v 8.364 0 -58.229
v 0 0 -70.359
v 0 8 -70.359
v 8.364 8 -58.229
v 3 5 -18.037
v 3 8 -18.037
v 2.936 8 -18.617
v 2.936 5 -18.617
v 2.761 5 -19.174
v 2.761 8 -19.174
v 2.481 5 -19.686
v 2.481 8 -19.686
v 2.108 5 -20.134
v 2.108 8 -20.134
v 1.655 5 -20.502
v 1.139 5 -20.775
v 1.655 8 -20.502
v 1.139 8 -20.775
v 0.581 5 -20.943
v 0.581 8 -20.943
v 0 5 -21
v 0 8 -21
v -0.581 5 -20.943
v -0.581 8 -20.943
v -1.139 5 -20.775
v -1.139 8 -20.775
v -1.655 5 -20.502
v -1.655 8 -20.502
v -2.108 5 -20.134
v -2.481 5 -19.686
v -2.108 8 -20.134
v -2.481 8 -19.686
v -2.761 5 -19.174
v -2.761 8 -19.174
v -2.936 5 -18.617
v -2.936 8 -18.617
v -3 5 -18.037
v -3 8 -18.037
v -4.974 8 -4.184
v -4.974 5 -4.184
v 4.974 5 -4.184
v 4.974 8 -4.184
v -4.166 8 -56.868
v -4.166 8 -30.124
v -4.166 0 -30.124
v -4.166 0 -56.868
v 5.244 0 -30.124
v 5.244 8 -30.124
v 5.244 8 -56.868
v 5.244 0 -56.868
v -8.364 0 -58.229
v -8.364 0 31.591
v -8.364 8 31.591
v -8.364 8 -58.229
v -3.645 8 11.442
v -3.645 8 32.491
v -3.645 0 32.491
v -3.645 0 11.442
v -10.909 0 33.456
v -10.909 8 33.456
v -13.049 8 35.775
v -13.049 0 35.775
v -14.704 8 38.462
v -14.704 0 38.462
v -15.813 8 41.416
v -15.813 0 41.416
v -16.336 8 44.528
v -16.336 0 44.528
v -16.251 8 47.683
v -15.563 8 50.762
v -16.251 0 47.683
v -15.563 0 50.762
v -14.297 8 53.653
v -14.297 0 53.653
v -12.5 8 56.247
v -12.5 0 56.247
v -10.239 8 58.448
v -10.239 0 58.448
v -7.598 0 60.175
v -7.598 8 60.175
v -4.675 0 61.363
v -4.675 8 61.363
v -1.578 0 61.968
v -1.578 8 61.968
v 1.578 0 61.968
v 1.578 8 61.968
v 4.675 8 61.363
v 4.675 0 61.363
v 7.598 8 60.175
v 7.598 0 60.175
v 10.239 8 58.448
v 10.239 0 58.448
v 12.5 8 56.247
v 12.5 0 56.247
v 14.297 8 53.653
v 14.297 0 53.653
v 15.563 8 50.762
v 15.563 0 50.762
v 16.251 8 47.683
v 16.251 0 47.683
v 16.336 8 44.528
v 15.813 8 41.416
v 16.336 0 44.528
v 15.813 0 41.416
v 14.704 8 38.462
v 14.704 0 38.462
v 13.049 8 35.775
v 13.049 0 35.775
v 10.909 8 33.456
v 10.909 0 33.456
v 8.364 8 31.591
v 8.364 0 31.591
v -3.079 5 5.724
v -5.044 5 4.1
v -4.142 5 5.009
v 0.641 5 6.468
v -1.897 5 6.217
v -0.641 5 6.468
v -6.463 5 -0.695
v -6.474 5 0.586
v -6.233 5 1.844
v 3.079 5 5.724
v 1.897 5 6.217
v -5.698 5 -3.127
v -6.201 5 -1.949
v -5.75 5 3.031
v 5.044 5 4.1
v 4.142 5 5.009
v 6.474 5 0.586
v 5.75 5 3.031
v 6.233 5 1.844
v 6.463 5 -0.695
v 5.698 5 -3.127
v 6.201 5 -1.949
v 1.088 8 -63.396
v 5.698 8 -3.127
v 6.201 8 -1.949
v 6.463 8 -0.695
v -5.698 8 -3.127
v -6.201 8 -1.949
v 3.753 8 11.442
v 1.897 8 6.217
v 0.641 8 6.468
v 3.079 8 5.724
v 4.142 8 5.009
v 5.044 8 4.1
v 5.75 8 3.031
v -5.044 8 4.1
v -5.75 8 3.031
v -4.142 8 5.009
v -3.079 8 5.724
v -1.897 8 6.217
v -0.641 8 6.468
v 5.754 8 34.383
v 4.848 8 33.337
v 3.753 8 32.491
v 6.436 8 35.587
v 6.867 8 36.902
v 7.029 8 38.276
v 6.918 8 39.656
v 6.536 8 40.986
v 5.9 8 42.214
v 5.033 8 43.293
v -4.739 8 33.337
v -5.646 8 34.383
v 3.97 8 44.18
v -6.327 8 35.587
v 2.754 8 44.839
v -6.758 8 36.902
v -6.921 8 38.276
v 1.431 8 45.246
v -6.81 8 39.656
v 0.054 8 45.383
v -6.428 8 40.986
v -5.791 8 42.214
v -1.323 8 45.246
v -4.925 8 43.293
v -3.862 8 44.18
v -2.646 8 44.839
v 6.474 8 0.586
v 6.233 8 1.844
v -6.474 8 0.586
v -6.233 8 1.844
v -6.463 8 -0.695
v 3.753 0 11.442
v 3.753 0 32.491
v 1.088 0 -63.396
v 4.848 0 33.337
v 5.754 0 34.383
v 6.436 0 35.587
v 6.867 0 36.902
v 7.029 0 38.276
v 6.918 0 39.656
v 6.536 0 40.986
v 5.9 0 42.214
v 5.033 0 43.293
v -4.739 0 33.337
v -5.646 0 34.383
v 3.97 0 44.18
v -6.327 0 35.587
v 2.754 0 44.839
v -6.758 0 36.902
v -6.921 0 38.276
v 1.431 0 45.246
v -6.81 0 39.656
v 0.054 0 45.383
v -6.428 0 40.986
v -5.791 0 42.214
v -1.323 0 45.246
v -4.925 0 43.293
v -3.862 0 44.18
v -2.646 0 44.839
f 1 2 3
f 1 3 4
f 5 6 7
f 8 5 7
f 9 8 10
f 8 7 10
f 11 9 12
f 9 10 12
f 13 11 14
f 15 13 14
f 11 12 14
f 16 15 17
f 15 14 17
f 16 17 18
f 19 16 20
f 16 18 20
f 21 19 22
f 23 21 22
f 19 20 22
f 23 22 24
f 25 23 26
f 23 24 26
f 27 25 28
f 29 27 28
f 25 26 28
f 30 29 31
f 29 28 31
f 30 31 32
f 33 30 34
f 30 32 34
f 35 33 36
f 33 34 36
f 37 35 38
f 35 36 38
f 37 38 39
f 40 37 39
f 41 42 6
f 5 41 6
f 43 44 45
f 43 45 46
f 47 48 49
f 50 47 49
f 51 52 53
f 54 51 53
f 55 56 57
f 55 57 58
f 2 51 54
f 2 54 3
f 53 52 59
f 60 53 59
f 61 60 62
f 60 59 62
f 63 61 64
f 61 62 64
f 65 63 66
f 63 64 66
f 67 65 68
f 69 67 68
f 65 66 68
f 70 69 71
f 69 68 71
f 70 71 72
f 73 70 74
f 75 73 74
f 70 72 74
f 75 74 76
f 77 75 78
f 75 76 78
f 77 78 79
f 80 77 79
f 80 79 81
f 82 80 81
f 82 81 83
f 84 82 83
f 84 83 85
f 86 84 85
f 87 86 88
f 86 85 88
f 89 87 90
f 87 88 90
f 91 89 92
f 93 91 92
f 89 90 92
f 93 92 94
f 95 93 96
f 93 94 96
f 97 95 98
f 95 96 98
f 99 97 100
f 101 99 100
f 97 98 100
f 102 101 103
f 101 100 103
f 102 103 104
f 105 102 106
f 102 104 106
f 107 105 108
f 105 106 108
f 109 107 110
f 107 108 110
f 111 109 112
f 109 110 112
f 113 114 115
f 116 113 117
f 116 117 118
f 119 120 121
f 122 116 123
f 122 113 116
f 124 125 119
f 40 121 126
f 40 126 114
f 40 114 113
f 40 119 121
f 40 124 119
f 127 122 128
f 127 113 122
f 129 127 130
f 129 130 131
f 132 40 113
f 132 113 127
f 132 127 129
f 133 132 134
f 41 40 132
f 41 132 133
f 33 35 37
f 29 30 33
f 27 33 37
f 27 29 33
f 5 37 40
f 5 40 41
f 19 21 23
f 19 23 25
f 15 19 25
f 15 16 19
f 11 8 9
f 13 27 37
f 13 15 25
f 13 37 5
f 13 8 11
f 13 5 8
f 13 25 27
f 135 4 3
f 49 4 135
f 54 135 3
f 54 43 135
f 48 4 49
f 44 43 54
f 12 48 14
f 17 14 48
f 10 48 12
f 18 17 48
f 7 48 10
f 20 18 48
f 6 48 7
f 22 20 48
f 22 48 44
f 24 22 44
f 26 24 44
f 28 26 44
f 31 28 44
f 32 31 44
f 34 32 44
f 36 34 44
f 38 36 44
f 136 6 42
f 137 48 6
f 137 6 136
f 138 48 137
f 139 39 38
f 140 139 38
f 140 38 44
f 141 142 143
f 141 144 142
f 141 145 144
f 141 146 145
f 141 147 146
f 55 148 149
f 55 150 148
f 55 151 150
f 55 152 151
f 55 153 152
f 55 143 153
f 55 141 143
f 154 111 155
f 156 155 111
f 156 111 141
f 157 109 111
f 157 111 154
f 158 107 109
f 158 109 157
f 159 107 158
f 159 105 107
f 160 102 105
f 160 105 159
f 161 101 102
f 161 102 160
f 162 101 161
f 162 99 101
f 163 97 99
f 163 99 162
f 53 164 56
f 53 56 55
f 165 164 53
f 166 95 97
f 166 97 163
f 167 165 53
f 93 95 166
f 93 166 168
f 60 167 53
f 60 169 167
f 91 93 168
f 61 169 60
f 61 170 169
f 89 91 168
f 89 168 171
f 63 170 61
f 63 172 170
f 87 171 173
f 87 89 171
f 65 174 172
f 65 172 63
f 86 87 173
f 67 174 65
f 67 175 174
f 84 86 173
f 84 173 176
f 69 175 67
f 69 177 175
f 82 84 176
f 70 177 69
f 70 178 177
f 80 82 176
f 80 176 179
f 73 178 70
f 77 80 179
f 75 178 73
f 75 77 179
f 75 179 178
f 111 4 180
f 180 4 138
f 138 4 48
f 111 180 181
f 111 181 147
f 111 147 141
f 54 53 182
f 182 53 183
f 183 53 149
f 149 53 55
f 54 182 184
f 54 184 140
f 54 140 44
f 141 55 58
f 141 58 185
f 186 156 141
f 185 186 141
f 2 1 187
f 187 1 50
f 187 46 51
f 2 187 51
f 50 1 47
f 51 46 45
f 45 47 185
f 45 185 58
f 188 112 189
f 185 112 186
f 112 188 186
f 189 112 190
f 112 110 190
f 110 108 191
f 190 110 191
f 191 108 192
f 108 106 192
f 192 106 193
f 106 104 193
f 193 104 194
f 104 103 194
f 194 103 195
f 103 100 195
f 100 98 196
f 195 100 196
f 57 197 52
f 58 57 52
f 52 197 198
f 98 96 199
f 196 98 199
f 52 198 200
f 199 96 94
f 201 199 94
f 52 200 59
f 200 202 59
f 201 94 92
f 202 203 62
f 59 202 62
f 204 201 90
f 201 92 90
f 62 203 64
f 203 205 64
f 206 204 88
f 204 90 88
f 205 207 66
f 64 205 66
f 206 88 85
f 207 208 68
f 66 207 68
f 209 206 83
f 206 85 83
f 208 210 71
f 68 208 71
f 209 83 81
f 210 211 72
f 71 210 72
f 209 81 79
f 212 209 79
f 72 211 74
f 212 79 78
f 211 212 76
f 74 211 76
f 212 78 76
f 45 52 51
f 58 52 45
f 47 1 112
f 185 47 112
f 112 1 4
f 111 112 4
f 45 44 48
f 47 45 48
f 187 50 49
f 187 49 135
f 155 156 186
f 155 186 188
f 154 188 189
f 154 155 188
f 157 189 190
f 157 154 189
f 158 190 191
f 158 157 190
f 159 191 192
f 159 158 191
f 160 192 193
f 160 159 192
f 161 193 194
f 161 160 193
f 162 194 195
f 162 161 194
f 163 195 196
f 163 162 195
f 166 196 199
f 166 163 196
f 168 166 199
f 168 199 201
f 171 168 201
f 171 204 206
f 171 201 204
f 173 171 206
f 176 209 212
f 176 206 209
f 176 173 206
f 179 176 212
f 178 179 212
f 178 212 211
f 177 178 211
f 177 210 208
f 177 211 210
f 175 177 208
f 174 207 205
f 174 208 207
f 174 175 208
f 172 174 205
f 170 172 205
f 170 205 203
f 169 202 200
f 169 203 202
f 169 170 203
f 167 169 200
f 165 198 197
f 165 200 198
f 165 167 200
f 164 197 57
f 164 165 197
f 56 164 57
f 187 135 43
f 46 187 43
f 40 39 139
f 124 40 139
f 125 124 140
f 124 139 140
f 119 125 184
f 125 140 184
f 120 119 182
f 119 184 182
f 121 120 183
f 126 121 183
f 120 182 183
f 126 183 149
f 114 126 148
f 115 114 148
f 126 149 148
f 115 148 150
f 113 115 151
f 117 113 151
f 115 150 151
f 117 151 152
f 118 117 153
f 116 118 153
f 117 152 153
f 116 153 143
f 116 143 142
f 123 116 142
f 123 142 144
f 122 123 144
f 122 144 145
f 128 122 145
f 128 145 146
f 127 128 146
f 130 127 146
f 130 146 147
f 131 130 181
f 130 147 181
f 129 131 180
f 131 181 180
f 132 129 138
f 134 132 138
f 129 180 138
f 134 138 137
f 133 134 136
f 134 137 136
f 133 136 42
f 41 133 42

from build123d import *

# Parameters (mm, degrees)
SKETCH2_R           = 16.37540157
SKETCH2_W           = 30
SKETCH2_H           = 50
SKETCH2_W_2         = 16.72757971
SKETCH2_H_2         = 91.338041812
BOSS_EXTRUDE1_DEPTH = 8
CUT_EXTRUDE1_DEPTH  = 3
SKETCH7_W           = 21
SKETCH7_H           = 41
SKETCH7_W_2         = 7
SKETCH7_H_2         = 18
CUT_EXTRUDE2_DEPTH  = 97.732382254
SKETCH8_W           = 42.713825064
SKETCH8_H           = 72.244370788
CUT_EXTRUDE3_DEPTH  = 97.732382254
SKETCH10_W          = 16.72757971
SKETCH10_H          = 8
BOSS_EXTRUDE3_DEPTH = 43
CUT_EXTRUDE4_DEPTH  = 23
SKETCH12_W          = 9.409731529
SKETCH12_H          = 26.743509799
SKETCH12_W_2        = 7.397521328
SKETCH12_H_2        = 21.048617388
CUT_EXTRUDE5_DEPTH  = 10


with BuildPart() as part:
    # Sketch2 → Boss-Extrude1 (new body)
    with BuildSketch(Plane(origin=(0, 0, 0), x_dir=(1, 0, 0), z_dir=(0, 1, 0))):
        with Locations((0, -45.669020906)):
            Circle(SKETCH2_R)
        with Locations((0, 70)):
            Rectangle(SKETCH2_W, SKETCH2_H)
        Rectangle(SKETCH2_W_2, SKETCH2_H_2)
    extrude(amount=BOSS_EXTRUDE1_DEPTH)

    # Sketch6 → Cut-Extrude1 (cut)
    with BuildSketch(Plane(origin=(0, 8, 0), x_dir=(1, 0, 0), z_dir=(0, 1, 0))):
        with BuildLine():
            Line((-2.999771067, 18.037061373), (-4.97435622, 4.183990942))
            ThreePointArc((-4.97435622, 4.183990942), (0, -6.5), (4.97435622, 4.183990942))
            Line((4.97435622, 4.183990942), (2.999771067, 18.037061373))
            ThreePointArc((2.999771067, 18.037061373), (0, 21), (-2.999771067, 18.037061373))
        make_face()
    extrude(amount=-CUT_EXTRUDE1_DEPTH, mode=Mode.SUBTRACT)

    # Sketch7 → Cut-Extrude2 (cut, through all)
    with BuildSketch(Plane.XZ):
        with Locations((0, -70)):
            Rectangle(SKETCH7_W, SKETCH7_H)
        with Locations((0, -49.5)):
            Rectangle(SKETCH7_W_2, SKETCH7_H_2)
    extrude(amount=-CUT_EXTRUDE2_DEPTH, mode=Mode.SUBTRACT)

    # Sketch8 → Cut-Extrude3 (cut, through all)
    with BuildSketch(Plane.XZ):
        with Locations((-1.974672585, -63.480825527)):
            Rectangle(SKETCH8_W, SKETCH8_H)
    extrude(amount=-CUT_EXTRUDE3_DEPTH, mode=Mode.SUBTRACT)

    # Sketch10 → Boss-Extrude3 (add)
    with BuildSketch(Plane(origin=(0, 0, -27.358640133), x_dir=(-1, 0, 0), z_dir=(0, 0, -1))):
        with Locations((0, 4)):
            Rectangle(SKETCH10_W, SKETCH10_H)
    extrude(amount=BOSS_EXTRUDE3_DEPTH)

    # Sketch11 → Cut-Extrude4 (cut)
    with BuildSketch(Plane.XZ):
        Polygon((-8.363789855, -58.228971018), (0, -70.358640133), (8.363789855, -58.228971018), (14.634786806, -58.228971018), (14.634786806, -78.124340067), (-16.486460869, -78.124340067), (-15.81957699, -58.228971018), align=None)
    extrude(amount=-CUT_EXTRUDE4_DEPTH, mode=Mode.SUBTRACT)

    # Sketch12 → Cut-Extrude5 (cut)
    with BuildSketch(Plane(origin=(0, 8, 0), x_dir=(1, 0, 0), z_dir=(0, 1, 0))):
        with Locations((0.538728684, 43.496138516)):
            Rectangle(SKETCH12_W, SKETCH12_H)
        with Locations((0.054120037, -21.966665665)):
            Rectangle(SKETCH12_W_2, SKETCH12_H_2)
        with BuildLine():
            ThreePointArc((3.752880701, -32.490974359), (0.054120037, -45.382739126), (-3.644640627, -32.490974359))
            Line((-3.644640627, -32.490974359), (3.752880701, -32.490974359))
        make_face()
        Polygon((5.243594448, 56.867893415), (1.087937996, 63.395652597), (-4.166137081, 56.867893415), align=None)
    extrude(amount=-CUT_EXTRUDE5_DEPTH, mode=Mode.SUBTRACT)


solid = part.part
